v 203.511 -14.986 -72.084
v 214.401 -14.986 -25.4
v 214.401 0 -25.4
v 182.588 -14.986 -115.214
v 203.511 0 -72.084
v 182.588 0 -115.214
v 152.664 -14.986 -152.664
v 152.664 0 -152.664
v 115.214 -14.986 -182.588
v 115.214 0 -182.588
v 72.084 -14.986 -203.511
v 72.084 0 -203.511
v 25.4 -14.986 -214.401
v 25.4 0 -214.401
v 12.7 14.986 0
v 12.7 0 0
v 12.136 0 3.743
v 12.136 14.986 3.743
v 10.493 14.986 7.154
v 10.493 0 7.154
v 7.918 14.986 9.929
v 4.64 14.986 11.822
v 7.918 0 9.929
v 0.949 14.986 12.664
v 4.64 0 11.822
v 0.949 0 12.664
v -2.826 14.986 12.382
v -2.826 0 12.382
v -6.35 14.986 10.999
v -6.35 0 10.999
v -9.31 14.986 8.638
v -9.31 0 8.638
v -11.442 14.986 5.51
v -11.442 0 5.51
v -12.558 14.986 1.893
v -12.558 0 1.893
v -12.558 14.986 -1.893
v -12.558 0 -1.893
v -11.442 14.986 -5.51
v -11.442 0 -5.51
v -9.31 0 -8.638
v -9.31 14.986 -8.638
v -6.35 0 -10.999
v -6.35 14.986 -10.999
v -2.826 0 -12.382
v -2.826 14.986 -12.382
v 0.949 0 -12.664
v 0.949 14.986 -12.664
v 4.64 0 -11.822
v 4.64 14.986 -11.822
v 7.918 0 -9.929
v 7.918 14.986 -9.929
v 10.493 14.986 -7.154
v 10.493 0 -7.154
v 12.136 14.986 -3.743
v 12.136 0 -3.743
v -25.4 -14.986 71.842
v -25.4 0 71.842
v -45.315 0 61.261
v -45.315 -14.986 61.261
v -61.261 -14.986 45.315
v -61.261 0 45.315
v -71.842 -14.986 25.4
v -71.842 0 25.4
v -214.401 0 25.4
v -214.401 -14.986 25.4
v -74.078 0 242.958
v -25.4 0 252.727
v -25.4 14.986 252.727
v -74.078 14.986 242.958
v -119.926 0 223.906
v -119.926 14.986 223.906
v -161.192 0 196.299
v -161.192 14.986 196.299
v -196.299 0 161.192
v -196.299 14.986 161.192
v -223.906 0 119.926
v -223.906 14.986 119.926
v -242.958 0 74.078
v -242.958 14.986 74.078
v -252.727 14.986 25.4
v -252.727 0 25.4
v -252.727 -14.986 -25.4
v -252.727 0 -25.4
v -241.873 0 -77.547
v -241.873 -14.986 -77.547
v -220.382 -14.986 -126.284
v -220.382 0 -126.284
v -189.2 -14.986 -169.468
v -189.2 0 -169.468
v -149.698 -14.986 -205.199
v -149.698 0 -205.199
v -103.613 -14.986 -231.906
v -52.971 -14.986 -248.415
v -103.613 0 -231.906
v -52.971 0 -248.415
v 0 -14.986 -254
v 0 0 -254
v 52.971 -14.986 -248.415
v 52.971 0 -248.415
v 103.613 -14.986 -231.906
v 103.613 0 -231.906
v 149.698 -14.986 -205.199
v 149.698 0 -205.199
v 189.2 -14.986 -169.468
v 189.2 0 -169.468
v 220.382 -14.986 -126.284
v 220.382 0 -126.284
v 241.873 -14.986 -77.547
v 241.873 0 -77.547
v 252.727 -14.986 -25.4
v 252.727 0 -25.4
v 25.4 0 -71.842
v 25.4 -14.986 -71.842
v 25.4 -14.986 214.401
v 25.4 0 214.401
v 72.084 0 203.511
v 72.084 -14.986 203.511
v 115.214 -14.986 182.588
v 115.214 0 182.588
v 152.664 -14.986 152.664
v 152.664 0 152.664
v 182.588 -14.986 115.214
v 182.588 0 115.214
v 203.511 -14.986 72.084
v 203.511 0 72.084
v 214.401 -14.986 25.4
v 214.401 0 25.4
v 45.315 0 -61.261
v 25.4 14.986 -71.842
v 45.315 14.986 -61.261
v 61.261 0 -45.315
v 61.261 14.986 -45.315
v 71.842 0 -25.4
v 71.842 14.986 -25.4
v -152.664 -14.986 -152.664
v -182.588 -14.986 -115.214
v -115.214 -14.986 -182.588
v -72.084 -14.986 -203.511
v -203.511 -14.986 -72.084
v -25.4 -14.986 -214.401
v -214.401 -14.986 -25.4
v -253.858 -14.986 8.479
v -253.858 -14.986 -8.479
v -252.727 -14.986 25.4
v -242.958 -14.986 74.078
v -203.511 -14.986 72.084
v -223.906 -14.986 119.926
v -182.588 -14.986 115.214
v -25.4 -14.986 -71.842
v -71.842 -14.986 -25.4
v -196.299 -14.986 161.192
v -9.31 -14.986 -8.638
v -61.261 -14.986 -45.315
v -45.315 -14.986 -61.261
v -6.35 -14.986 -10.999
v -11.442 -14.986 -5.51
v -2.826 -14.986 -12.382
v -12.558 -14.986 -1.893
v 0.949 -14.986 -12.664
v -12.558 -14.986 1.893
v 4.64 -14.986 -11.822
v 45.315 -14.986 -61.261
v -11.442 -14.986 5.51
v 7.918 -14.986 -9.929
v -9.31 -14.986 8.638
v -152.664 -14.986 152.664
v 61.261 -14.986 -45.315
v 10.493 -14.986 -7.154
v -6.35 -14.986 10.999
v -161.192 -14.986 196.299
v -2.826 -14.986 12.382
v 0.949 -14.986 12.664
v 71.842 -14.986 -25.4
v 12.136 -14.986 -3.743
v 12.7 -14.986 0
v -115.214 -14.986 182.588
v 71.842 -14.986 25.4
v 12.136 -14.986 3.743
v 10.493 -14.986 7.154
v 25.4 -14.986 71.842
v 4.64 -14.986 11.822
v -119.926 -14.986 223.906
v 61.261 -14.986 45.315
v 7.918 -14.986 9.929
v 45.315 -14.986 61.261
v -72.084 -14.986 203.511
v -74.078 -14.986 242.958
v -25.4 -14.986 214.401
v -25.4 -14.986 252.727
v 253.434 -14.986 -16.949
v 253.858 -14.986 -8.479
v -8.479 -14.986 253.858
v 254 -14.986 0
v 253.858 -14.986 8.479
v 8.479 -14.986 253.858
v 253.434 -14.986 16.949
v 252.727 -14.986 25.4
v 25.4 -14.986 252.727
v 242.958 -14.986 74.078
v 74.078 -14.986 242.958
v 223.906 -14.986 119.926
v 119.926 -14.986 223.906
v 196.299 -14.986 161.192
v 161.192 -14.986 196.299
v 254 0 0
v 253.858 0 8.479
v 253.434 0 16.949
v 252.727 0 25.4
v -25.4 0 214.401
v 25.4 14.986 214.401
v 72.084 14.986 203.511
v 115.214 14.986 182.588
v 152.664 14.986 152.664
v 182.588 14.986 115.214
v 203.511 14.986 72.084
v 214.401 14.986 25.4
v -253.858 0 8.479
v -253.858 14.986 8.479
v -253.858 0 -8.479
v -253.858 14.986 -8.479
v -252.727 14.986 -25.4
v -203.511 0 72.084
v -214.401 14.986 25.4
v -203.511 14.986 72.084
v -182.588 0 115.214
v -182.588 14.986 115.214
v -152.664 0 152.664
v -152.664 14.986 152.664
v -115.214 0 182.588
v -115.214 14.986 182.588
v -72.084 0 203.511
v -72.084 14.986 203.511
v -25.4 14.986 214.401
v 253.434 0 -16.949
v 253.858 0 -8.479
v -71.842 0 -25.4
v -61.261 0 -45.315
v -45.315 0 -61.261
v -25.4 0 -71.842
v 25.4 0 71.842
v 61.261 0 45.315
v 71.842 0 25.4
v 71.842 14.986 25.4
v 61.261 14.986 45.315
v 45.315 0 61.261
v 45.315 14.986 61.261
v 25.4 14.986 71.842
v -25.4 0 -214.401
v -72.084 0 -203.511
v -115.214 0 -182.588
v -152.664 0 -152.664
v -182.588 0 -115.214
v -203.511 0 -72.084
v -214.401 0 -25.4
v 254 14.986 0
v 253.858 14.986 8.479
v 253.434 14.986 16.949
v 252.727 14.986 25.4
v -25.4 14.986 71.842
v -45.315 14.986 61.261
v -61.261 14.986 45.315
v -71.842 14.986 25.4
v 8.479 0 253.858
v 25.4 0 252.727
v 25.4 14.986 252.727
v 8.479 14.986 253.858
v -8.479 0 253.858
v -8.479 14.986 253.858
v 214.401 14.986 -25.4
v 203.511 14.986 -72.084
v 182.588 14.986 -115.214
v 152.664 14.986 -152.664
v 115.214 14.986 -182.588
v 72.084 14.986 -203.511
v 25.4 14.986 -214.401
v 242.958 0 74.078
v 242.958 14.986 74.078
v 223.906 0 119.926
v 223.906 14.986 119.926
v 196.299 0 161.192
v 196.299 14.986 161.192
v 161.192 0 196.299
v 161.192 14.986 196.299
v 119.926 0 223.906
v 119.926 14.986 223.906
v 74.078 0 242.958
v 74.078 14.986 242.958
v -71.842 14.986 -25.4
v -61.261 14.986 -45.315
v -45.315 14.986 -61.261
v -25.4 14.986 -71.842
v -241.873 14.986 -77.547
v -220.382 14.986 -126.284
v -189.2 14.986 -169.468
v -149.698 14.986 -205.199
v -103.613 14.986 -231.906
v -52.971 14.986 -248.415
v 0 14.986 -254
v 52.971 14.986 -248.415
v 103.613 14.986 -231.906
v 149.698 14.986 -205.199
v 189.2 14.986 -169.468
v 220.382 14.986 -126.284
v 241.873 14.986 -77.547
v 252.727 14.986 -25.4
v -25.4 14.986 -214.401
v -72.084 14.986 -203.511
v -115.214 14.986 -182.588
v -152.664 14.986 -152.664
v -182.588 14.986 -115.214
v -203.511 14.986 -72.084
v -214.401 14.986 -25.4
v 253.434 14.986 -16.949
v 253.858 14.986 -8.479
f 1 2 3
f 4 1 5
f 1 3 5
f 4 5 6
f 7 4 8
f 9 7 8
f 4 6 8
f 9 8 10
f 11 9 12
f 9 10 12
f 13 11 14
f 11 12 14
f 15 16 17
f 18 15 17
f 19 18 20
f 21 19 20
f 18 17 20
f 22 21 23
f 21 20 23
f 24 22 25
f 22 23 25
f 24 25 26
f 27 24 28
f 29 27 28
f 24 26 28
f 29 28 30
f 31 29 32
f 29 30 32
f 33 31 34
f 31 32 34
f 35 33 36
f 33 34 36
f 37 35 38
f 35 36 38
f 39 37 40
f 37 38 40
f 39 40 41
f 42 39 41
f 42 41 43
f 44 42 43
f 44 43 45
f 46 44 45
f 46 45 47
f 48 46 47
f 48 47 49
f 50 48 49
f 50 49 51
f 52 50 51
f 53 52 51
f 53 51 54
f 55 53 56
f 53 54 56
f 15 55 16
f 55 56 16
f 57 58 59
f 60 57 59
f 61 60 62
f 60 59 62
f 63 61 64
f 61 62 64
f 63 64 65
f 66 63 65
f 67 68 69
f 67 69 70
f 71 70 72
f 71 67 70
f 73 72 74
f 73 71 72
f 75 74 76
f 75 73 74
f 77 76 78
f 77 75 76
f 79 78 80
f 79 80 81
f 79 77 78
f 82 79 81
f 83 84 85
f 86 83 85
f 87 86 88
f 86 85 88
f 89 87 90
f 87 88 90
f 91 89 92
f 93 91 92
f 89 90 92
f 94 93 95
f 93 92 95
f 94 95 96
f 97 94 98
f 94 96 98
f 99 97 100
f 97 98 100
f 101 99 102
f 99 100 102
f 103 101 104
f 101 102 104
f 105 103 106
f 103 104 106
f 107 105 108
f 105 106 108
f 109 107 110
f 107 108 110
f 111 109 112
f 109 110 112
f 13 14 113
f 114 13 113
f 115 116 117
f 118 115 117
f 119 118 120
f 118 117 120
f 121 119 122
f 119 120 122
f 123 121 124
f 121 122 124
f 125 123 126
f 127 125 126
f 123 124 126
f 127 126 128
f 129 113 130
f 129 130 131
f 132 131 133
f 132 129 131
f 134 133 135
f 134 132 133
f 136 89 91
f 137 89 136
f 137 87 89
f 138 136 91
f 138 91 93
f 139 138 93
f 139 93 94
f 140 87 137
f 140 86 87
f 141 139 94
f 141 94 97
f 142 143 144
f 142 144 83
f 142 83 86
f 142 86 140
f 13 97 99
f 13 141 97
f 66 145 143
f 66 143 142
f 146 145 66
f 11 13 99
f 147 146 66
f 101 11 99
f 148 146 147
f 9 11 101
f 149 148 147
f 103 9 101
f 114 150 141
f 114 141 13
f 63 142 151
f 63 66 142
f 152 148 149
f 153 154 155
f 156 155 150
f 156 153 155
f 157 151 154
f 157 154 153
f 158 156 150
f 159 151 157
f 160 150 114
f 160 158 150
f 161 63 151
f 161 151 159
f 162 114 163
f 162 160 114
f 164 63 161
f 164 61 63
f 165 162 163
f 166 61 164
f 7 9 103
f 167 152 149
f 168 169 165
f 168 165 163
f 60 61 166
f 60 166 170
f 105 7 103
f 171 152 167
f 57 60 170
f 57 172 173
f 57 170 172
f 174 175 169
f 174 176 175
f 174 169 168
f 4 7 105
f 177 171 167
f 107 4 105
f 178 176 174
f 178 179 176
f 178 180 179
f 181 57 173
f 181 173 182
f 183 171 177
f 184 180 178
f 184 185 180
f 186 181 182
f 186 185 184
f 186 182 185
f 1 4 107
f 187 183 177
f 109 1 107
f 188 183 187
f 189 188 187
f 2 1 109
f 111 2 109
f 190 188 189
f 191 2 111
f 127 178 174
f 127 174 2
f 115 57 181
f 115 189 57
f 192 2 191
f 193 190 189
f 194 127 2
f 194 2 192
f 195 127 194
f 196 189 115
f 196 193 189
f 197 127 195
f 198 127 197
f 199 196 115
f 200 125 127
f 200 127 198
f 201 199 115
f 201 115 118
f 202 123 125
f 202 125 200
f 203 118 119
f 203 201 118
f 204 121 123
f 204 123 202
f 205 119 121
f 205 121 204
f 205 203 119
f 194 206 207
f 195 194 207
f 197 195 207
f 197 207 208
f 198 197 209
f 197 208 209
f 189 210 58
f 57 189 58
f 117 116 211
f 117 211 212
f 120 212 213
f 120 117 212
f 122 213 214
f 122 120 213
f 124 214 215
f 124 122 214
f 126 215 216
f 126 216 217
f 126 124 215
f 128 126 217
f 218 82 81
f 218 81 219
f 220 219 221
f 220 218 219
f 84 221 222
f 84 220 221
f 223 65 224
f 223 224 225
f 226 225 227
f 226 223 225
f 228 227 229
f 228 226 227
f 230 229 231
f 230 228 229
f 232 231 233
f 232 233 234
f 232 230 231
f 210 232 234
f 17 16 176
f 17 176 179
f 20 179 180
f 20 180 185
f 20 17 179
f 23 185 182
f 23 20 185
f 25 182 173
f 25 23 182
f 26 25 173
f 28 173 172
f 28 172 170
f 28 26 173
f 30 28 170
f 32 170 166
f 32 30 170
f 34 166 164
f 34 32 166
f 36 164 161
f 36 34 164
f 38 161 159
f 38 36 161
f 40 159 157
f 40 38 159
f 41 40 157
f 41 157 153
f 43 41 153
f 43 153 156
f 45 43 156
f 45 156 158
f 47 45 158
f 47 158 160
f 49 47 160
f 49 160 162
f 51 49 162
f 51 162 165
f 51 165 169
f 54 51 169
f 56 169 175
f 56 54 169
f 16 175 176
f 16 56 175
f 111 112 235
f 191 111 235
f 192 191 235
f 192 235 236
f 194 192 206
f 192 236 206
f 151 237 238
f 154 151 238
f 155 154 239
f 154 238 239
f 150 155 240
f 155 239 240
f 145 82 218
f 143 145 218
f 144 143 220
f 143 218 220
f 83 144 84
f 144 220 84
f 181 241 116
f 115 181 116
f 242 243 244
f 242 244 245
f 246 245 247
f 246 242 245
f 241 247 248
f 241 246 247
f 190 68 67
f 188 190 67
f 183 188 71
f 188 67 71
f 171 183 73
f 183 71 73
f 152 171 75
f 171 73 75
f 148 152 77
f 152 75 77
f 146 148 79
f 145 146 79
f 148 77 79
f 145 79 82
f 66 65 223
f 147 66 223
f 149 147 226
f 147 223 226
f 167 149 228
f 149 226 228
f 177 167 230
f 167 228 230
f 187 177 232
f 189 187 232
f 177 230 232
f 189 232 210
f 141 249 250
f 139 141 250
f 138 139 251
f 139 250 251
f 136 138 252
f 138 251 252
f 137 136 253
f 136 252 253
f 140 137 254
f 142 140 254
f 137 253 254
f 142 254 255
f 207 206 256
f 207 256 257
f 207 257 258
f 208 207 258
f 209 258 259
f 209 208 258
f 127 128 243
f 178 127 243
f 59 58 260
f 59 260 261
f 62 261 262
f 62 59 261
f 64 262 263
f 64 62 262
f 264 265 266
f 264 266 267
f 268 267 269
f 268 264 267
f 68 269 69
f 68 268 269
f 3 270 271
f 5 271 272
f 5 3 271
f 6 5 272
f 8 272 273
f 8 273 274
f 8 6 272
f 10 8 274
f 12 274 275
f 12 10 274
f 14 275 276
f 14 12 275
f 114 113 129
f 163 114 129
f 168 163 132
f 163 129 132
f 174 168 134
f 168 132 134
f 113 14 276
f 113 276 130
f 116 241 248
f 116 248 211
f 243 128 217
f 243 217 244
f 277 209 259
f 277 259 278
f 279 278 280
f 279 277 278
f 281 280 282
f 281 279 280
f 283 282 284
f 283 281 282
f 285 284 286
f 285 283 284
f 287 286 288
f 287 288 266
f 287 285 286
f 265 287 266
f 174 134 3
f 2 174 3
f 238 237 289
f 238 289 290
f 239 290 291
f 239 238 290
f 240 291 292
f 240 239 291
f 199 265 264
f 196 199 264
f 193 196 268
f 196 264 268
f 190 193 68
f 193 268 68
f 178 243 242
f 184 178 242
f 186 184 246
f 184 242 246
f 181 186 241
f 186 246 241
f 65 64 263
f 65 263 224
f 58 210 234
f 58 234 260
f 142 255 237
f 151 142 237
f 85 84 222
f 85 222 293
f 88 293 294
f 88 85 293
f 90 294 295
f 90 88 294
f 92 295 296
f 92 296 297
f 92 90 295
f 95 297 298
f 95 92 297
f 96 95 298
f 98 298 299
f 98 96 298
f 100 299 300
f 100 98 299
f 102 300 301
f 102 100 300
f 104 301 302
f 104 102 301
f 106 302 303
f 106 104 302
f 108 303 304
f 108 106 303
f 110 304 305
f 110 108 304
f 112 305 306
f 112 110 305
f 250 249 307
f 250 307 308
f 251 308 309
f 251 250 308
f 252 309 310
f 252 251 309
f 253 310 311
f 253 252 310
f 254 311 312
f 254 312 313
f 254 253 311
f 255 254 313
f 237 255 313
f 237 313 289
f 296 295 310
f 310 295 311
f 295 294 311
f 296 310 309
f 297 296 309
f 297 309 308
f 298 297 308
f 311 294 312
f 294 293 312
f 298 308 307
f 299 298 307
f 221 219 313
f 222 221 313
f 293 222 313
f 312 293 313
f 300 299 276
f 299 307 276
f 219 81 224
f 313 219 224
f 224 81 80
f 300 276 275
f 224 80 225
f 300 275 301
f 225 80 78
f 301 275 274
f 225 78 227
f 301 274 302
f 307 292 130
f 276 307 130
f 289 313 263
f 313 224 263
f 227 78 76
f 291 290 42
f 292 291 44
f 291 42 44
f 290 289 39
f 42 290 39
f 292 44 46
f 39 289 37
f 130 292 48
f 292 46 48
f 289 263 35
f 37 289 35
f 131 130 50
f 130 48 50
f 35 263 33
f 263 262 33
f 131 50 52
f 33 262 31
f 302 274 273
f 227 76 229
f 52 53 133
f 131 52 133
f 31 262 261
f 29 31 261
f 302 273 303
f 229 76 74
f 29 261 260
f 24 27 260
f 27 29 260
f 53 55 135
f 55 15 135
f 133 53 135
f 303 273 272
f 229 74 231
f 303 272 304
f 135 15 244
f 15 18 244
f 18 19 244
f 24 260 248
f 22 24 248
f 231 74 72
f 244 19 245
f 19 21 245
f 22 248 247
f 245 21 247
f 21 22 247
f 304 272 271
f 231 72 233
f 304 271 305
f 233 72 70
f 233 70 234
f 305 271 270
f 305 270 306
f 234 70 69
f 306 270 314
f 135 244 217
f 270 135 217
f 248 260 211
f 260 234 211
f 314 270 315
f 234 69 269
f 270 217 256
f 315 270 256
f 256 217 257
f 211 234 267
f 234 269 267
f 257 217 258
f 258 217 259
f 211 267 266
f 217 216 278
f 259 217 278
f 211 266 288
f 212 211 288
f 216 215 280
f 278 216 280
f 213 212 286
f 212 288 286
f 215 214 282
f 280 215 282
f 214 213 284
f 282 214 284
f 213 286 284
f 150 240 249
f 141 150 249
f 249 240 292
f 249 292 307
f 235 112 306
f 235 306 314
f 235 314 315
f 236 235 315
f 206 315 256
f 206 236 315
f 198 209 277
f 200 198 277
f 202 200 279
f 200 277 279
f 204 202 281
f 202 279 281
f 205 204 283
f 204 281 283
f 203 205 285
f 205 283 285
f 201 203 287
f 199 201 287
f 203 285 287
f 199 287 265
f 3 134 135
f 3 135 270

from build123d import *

# Parameters (mm, degrees)
F0_R     = 12.7
F1_DEPTH = 14.986


# Not quite as in the source:
# - a feature names something its author has since deleted; it is built from what else it names


with BuildPart() as f1:
    # F0 (on Front) → F1 (new body, symmetric)
    with BuildSketch(Plane.XZ):
        with BuildLine():
            ThreePointArc((252.7268090251, -25.4), (253.68150257, -12.7159448652), (254, 0))
            ThreePointArc((254, 0), (253.68150257, 12.7159448652), (252.7268090251, 25.4))
            ThreePointArc((252.7268090251, 25.4), (179.6051224214, 179.6051224214), (25.4, 252.7268090251))
            ThreePointArc((25.4, 252.7268090251), (0, 254), (-25.4, 252.7268090251))
            ThreePointArc((-25.4, 252.7268090251), (-179.6051224214, 179.6051224214), (-252.7268090251, 25.4))
            ThreePointArc((-252.7268090251, 25.4), (-254, 0), (-252.7268090251, -25.4))
            ThreePointArc((-252.7268090251, -25.4), (-179.6051224214, -179.6051224214), (-25.4, -252.7268090251))
            ThreePointArc((-25.4, -252.7268090251), (-1.543e-07, -254), (25.399999693, -252.7268090559))
            ThreePointArc((25.399999693, -252.7268090559), (179.6051223123, -179.6051225305), (252.7268090251, -25.4))
        make_face()
        with BuildLine():
            ThreePointArc((-25.4, -214.4006763049), (-152.6643540582, -152.6643540582), (-214.4006763049, -25.4))
            Line((-214.4006763049, -25.4), (-71.8420489686, -25.4))
            ThreePointArc((-71.8420489686, -25.4), (-53.8815367264, -53.8815367264), (-25.4, -71.8420489686))
            Line((-25.4, -71.8420489686), (-25.4, -214.4006763049))
        make_face(mode=Mode.SUBTRACT)
        with BuildLine():
            ThreePointArc((25.399999693, -71.8420490771), (53.8815366113, -53.8815368415), (71.8420489686, -25.4))
            Line((71.8420489686, -25.4), (214.4006763049, -25.4))
            ThreePointArc((214.4006763049, -25.4), (152.6643539489, -152.6643541675), (25.399999693, -214.4006763413))
            Line((25.399999693, -214.4006763413), (25.399999693, -71.8420490771))
        make_face(mode=Mode.SUBTRACT)
        with BuildLine():
            Line((-25.4, 214.4006763049), (-25.4, 71.8420489686))
            ThreePointArc((-25.4, 71.8420489686), (-53.8815367264, 53.8815367264), (-71.8420489686, 25.4))
            Line((-71.8420489686, 25.4), (-214.4006763049, 25.4))
            ThreePointArc((-214.4006763049, 25.4), (-152.6643540582, 152.6643540582), (-25.4, 214.4006763049))
        make_face(mode=Mode.SUBTRACT)
        Circle(F0_R, mode=Mode.SUBTRACT)
        with BuildLine():
            ThreePointArc((71.8420489686, 25.4), (53.8815367264, 53.8815367264), (25.4, 71.8420489686))
            Line((25.4, 71.8420489686), (25.4, 214.4006763049))
            ThreePointArc((25.4, 214.4006763049), (152.6643540582, 152.6643540582), (214.4006763049, 25.4))
            Line((214.4006763049, 25.4), (71.8420489686, 25.4))
        make_face(mode=Mode.SUBTRACT)
    extrude(amount=F1_DEPTH, both=True)


solid = f1.part
